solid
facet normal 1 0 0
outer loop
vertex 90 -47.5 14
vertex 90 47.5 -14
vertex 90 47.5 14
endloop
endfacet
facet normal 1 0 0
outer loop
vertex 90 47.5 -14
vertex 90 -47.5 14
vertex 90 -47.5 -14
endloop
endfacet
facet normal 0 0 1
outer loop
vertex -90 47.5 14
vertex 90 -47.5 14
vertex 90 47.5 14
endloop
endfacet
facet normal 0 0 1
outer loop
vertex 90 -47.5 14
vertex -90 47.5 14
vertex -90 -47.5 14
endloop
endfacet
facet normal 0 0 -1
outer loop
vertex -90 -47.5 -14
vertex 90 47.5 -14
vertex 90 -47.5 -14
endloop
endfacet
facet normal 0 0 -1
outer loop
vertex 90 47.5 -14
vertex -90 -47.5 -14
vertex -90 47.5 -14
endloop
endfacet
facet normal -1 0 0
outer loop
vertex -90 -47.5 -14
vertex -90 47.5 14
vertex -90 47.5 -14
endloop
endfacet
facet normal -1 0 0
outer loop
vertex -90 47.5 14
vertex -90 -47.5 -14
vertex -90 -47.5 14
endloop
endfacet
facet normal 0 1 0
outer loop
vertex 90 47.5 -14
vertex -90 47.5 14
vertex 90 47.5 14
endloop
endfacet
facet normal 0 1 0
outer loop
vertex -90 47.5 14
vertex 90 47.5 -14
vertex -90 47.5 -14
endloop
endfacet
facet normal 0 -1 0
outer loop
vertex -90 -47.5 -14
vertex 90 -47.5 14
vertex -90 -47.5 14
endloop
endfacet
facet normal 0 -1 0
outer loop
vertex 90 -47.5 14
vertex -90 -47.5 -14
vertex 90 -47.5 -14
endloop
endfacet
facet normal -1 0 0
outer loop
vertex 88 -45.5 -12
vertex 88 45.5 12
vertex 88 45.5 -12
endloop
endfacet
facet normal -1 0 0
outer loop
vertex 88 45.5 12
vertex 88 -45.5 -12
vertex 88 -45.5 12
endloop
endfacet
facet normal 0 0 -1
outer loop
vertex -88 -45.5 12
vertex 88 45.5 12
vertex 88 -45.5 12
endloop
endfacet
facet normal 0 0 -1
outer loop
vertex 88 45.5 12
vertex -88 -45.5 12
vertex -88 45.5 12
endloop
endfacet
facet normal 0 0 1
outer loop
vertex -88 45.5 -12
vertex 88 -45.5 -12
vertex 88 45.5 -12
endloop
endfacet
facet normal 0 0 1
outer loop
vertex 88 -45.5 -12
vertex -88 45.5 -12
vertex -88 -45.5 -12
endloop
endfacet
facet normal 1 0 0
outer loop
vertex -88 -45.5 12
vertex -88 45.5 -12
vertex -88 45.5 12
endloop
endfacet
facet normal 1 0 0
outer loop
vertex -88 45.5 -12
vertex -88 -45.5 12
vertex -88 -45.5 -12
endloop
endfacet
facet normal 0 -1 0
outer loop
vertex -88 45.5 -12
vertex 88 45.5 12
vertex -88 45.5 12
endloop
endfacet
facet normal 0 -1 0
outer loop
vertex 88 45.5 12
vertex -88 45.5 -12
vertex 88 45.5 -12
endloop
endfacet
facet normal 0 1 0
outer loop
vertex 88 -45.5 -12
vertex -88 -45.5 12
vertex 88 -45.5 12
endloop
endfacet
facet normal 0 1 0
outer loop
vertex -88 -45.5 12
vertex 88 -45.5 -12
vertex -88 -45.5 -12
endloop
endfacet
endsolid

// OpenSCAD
// REPRESENTATIVE_ENCLOSURE — parameterized concept model
// Device: Handheld Hybrid (handheld_hybrid)
// Status: REPRESENTATIVE_ENCLOSURE_PHYSICAL_PENDING
// Evidence class: MODELED (not MEASURED)

device_id = "handheld_hybrid";
outer_w = 180;
outer_d = 95;
outer_h = 28;
wall = 2.0;
corner_r = 4.0;
tolerance = 0.3;

module outer_shell() {
  difference() {
    cube([outer_w, outer_d, outer_h], center=true);
    cube([outer_w-2*wall, outer_d-2*wall, outer_h-2*wall], center=true);
  }
}

module interference_keepout() {
  // Battery / PCB keepouts for digital interference check
  translate([0, 0, -outer_h/4]) cube([outer_w*0.6, outer_d*0.5, outer_h*0.35], center=true);
}

outer_shell();
%interference_keepout();
